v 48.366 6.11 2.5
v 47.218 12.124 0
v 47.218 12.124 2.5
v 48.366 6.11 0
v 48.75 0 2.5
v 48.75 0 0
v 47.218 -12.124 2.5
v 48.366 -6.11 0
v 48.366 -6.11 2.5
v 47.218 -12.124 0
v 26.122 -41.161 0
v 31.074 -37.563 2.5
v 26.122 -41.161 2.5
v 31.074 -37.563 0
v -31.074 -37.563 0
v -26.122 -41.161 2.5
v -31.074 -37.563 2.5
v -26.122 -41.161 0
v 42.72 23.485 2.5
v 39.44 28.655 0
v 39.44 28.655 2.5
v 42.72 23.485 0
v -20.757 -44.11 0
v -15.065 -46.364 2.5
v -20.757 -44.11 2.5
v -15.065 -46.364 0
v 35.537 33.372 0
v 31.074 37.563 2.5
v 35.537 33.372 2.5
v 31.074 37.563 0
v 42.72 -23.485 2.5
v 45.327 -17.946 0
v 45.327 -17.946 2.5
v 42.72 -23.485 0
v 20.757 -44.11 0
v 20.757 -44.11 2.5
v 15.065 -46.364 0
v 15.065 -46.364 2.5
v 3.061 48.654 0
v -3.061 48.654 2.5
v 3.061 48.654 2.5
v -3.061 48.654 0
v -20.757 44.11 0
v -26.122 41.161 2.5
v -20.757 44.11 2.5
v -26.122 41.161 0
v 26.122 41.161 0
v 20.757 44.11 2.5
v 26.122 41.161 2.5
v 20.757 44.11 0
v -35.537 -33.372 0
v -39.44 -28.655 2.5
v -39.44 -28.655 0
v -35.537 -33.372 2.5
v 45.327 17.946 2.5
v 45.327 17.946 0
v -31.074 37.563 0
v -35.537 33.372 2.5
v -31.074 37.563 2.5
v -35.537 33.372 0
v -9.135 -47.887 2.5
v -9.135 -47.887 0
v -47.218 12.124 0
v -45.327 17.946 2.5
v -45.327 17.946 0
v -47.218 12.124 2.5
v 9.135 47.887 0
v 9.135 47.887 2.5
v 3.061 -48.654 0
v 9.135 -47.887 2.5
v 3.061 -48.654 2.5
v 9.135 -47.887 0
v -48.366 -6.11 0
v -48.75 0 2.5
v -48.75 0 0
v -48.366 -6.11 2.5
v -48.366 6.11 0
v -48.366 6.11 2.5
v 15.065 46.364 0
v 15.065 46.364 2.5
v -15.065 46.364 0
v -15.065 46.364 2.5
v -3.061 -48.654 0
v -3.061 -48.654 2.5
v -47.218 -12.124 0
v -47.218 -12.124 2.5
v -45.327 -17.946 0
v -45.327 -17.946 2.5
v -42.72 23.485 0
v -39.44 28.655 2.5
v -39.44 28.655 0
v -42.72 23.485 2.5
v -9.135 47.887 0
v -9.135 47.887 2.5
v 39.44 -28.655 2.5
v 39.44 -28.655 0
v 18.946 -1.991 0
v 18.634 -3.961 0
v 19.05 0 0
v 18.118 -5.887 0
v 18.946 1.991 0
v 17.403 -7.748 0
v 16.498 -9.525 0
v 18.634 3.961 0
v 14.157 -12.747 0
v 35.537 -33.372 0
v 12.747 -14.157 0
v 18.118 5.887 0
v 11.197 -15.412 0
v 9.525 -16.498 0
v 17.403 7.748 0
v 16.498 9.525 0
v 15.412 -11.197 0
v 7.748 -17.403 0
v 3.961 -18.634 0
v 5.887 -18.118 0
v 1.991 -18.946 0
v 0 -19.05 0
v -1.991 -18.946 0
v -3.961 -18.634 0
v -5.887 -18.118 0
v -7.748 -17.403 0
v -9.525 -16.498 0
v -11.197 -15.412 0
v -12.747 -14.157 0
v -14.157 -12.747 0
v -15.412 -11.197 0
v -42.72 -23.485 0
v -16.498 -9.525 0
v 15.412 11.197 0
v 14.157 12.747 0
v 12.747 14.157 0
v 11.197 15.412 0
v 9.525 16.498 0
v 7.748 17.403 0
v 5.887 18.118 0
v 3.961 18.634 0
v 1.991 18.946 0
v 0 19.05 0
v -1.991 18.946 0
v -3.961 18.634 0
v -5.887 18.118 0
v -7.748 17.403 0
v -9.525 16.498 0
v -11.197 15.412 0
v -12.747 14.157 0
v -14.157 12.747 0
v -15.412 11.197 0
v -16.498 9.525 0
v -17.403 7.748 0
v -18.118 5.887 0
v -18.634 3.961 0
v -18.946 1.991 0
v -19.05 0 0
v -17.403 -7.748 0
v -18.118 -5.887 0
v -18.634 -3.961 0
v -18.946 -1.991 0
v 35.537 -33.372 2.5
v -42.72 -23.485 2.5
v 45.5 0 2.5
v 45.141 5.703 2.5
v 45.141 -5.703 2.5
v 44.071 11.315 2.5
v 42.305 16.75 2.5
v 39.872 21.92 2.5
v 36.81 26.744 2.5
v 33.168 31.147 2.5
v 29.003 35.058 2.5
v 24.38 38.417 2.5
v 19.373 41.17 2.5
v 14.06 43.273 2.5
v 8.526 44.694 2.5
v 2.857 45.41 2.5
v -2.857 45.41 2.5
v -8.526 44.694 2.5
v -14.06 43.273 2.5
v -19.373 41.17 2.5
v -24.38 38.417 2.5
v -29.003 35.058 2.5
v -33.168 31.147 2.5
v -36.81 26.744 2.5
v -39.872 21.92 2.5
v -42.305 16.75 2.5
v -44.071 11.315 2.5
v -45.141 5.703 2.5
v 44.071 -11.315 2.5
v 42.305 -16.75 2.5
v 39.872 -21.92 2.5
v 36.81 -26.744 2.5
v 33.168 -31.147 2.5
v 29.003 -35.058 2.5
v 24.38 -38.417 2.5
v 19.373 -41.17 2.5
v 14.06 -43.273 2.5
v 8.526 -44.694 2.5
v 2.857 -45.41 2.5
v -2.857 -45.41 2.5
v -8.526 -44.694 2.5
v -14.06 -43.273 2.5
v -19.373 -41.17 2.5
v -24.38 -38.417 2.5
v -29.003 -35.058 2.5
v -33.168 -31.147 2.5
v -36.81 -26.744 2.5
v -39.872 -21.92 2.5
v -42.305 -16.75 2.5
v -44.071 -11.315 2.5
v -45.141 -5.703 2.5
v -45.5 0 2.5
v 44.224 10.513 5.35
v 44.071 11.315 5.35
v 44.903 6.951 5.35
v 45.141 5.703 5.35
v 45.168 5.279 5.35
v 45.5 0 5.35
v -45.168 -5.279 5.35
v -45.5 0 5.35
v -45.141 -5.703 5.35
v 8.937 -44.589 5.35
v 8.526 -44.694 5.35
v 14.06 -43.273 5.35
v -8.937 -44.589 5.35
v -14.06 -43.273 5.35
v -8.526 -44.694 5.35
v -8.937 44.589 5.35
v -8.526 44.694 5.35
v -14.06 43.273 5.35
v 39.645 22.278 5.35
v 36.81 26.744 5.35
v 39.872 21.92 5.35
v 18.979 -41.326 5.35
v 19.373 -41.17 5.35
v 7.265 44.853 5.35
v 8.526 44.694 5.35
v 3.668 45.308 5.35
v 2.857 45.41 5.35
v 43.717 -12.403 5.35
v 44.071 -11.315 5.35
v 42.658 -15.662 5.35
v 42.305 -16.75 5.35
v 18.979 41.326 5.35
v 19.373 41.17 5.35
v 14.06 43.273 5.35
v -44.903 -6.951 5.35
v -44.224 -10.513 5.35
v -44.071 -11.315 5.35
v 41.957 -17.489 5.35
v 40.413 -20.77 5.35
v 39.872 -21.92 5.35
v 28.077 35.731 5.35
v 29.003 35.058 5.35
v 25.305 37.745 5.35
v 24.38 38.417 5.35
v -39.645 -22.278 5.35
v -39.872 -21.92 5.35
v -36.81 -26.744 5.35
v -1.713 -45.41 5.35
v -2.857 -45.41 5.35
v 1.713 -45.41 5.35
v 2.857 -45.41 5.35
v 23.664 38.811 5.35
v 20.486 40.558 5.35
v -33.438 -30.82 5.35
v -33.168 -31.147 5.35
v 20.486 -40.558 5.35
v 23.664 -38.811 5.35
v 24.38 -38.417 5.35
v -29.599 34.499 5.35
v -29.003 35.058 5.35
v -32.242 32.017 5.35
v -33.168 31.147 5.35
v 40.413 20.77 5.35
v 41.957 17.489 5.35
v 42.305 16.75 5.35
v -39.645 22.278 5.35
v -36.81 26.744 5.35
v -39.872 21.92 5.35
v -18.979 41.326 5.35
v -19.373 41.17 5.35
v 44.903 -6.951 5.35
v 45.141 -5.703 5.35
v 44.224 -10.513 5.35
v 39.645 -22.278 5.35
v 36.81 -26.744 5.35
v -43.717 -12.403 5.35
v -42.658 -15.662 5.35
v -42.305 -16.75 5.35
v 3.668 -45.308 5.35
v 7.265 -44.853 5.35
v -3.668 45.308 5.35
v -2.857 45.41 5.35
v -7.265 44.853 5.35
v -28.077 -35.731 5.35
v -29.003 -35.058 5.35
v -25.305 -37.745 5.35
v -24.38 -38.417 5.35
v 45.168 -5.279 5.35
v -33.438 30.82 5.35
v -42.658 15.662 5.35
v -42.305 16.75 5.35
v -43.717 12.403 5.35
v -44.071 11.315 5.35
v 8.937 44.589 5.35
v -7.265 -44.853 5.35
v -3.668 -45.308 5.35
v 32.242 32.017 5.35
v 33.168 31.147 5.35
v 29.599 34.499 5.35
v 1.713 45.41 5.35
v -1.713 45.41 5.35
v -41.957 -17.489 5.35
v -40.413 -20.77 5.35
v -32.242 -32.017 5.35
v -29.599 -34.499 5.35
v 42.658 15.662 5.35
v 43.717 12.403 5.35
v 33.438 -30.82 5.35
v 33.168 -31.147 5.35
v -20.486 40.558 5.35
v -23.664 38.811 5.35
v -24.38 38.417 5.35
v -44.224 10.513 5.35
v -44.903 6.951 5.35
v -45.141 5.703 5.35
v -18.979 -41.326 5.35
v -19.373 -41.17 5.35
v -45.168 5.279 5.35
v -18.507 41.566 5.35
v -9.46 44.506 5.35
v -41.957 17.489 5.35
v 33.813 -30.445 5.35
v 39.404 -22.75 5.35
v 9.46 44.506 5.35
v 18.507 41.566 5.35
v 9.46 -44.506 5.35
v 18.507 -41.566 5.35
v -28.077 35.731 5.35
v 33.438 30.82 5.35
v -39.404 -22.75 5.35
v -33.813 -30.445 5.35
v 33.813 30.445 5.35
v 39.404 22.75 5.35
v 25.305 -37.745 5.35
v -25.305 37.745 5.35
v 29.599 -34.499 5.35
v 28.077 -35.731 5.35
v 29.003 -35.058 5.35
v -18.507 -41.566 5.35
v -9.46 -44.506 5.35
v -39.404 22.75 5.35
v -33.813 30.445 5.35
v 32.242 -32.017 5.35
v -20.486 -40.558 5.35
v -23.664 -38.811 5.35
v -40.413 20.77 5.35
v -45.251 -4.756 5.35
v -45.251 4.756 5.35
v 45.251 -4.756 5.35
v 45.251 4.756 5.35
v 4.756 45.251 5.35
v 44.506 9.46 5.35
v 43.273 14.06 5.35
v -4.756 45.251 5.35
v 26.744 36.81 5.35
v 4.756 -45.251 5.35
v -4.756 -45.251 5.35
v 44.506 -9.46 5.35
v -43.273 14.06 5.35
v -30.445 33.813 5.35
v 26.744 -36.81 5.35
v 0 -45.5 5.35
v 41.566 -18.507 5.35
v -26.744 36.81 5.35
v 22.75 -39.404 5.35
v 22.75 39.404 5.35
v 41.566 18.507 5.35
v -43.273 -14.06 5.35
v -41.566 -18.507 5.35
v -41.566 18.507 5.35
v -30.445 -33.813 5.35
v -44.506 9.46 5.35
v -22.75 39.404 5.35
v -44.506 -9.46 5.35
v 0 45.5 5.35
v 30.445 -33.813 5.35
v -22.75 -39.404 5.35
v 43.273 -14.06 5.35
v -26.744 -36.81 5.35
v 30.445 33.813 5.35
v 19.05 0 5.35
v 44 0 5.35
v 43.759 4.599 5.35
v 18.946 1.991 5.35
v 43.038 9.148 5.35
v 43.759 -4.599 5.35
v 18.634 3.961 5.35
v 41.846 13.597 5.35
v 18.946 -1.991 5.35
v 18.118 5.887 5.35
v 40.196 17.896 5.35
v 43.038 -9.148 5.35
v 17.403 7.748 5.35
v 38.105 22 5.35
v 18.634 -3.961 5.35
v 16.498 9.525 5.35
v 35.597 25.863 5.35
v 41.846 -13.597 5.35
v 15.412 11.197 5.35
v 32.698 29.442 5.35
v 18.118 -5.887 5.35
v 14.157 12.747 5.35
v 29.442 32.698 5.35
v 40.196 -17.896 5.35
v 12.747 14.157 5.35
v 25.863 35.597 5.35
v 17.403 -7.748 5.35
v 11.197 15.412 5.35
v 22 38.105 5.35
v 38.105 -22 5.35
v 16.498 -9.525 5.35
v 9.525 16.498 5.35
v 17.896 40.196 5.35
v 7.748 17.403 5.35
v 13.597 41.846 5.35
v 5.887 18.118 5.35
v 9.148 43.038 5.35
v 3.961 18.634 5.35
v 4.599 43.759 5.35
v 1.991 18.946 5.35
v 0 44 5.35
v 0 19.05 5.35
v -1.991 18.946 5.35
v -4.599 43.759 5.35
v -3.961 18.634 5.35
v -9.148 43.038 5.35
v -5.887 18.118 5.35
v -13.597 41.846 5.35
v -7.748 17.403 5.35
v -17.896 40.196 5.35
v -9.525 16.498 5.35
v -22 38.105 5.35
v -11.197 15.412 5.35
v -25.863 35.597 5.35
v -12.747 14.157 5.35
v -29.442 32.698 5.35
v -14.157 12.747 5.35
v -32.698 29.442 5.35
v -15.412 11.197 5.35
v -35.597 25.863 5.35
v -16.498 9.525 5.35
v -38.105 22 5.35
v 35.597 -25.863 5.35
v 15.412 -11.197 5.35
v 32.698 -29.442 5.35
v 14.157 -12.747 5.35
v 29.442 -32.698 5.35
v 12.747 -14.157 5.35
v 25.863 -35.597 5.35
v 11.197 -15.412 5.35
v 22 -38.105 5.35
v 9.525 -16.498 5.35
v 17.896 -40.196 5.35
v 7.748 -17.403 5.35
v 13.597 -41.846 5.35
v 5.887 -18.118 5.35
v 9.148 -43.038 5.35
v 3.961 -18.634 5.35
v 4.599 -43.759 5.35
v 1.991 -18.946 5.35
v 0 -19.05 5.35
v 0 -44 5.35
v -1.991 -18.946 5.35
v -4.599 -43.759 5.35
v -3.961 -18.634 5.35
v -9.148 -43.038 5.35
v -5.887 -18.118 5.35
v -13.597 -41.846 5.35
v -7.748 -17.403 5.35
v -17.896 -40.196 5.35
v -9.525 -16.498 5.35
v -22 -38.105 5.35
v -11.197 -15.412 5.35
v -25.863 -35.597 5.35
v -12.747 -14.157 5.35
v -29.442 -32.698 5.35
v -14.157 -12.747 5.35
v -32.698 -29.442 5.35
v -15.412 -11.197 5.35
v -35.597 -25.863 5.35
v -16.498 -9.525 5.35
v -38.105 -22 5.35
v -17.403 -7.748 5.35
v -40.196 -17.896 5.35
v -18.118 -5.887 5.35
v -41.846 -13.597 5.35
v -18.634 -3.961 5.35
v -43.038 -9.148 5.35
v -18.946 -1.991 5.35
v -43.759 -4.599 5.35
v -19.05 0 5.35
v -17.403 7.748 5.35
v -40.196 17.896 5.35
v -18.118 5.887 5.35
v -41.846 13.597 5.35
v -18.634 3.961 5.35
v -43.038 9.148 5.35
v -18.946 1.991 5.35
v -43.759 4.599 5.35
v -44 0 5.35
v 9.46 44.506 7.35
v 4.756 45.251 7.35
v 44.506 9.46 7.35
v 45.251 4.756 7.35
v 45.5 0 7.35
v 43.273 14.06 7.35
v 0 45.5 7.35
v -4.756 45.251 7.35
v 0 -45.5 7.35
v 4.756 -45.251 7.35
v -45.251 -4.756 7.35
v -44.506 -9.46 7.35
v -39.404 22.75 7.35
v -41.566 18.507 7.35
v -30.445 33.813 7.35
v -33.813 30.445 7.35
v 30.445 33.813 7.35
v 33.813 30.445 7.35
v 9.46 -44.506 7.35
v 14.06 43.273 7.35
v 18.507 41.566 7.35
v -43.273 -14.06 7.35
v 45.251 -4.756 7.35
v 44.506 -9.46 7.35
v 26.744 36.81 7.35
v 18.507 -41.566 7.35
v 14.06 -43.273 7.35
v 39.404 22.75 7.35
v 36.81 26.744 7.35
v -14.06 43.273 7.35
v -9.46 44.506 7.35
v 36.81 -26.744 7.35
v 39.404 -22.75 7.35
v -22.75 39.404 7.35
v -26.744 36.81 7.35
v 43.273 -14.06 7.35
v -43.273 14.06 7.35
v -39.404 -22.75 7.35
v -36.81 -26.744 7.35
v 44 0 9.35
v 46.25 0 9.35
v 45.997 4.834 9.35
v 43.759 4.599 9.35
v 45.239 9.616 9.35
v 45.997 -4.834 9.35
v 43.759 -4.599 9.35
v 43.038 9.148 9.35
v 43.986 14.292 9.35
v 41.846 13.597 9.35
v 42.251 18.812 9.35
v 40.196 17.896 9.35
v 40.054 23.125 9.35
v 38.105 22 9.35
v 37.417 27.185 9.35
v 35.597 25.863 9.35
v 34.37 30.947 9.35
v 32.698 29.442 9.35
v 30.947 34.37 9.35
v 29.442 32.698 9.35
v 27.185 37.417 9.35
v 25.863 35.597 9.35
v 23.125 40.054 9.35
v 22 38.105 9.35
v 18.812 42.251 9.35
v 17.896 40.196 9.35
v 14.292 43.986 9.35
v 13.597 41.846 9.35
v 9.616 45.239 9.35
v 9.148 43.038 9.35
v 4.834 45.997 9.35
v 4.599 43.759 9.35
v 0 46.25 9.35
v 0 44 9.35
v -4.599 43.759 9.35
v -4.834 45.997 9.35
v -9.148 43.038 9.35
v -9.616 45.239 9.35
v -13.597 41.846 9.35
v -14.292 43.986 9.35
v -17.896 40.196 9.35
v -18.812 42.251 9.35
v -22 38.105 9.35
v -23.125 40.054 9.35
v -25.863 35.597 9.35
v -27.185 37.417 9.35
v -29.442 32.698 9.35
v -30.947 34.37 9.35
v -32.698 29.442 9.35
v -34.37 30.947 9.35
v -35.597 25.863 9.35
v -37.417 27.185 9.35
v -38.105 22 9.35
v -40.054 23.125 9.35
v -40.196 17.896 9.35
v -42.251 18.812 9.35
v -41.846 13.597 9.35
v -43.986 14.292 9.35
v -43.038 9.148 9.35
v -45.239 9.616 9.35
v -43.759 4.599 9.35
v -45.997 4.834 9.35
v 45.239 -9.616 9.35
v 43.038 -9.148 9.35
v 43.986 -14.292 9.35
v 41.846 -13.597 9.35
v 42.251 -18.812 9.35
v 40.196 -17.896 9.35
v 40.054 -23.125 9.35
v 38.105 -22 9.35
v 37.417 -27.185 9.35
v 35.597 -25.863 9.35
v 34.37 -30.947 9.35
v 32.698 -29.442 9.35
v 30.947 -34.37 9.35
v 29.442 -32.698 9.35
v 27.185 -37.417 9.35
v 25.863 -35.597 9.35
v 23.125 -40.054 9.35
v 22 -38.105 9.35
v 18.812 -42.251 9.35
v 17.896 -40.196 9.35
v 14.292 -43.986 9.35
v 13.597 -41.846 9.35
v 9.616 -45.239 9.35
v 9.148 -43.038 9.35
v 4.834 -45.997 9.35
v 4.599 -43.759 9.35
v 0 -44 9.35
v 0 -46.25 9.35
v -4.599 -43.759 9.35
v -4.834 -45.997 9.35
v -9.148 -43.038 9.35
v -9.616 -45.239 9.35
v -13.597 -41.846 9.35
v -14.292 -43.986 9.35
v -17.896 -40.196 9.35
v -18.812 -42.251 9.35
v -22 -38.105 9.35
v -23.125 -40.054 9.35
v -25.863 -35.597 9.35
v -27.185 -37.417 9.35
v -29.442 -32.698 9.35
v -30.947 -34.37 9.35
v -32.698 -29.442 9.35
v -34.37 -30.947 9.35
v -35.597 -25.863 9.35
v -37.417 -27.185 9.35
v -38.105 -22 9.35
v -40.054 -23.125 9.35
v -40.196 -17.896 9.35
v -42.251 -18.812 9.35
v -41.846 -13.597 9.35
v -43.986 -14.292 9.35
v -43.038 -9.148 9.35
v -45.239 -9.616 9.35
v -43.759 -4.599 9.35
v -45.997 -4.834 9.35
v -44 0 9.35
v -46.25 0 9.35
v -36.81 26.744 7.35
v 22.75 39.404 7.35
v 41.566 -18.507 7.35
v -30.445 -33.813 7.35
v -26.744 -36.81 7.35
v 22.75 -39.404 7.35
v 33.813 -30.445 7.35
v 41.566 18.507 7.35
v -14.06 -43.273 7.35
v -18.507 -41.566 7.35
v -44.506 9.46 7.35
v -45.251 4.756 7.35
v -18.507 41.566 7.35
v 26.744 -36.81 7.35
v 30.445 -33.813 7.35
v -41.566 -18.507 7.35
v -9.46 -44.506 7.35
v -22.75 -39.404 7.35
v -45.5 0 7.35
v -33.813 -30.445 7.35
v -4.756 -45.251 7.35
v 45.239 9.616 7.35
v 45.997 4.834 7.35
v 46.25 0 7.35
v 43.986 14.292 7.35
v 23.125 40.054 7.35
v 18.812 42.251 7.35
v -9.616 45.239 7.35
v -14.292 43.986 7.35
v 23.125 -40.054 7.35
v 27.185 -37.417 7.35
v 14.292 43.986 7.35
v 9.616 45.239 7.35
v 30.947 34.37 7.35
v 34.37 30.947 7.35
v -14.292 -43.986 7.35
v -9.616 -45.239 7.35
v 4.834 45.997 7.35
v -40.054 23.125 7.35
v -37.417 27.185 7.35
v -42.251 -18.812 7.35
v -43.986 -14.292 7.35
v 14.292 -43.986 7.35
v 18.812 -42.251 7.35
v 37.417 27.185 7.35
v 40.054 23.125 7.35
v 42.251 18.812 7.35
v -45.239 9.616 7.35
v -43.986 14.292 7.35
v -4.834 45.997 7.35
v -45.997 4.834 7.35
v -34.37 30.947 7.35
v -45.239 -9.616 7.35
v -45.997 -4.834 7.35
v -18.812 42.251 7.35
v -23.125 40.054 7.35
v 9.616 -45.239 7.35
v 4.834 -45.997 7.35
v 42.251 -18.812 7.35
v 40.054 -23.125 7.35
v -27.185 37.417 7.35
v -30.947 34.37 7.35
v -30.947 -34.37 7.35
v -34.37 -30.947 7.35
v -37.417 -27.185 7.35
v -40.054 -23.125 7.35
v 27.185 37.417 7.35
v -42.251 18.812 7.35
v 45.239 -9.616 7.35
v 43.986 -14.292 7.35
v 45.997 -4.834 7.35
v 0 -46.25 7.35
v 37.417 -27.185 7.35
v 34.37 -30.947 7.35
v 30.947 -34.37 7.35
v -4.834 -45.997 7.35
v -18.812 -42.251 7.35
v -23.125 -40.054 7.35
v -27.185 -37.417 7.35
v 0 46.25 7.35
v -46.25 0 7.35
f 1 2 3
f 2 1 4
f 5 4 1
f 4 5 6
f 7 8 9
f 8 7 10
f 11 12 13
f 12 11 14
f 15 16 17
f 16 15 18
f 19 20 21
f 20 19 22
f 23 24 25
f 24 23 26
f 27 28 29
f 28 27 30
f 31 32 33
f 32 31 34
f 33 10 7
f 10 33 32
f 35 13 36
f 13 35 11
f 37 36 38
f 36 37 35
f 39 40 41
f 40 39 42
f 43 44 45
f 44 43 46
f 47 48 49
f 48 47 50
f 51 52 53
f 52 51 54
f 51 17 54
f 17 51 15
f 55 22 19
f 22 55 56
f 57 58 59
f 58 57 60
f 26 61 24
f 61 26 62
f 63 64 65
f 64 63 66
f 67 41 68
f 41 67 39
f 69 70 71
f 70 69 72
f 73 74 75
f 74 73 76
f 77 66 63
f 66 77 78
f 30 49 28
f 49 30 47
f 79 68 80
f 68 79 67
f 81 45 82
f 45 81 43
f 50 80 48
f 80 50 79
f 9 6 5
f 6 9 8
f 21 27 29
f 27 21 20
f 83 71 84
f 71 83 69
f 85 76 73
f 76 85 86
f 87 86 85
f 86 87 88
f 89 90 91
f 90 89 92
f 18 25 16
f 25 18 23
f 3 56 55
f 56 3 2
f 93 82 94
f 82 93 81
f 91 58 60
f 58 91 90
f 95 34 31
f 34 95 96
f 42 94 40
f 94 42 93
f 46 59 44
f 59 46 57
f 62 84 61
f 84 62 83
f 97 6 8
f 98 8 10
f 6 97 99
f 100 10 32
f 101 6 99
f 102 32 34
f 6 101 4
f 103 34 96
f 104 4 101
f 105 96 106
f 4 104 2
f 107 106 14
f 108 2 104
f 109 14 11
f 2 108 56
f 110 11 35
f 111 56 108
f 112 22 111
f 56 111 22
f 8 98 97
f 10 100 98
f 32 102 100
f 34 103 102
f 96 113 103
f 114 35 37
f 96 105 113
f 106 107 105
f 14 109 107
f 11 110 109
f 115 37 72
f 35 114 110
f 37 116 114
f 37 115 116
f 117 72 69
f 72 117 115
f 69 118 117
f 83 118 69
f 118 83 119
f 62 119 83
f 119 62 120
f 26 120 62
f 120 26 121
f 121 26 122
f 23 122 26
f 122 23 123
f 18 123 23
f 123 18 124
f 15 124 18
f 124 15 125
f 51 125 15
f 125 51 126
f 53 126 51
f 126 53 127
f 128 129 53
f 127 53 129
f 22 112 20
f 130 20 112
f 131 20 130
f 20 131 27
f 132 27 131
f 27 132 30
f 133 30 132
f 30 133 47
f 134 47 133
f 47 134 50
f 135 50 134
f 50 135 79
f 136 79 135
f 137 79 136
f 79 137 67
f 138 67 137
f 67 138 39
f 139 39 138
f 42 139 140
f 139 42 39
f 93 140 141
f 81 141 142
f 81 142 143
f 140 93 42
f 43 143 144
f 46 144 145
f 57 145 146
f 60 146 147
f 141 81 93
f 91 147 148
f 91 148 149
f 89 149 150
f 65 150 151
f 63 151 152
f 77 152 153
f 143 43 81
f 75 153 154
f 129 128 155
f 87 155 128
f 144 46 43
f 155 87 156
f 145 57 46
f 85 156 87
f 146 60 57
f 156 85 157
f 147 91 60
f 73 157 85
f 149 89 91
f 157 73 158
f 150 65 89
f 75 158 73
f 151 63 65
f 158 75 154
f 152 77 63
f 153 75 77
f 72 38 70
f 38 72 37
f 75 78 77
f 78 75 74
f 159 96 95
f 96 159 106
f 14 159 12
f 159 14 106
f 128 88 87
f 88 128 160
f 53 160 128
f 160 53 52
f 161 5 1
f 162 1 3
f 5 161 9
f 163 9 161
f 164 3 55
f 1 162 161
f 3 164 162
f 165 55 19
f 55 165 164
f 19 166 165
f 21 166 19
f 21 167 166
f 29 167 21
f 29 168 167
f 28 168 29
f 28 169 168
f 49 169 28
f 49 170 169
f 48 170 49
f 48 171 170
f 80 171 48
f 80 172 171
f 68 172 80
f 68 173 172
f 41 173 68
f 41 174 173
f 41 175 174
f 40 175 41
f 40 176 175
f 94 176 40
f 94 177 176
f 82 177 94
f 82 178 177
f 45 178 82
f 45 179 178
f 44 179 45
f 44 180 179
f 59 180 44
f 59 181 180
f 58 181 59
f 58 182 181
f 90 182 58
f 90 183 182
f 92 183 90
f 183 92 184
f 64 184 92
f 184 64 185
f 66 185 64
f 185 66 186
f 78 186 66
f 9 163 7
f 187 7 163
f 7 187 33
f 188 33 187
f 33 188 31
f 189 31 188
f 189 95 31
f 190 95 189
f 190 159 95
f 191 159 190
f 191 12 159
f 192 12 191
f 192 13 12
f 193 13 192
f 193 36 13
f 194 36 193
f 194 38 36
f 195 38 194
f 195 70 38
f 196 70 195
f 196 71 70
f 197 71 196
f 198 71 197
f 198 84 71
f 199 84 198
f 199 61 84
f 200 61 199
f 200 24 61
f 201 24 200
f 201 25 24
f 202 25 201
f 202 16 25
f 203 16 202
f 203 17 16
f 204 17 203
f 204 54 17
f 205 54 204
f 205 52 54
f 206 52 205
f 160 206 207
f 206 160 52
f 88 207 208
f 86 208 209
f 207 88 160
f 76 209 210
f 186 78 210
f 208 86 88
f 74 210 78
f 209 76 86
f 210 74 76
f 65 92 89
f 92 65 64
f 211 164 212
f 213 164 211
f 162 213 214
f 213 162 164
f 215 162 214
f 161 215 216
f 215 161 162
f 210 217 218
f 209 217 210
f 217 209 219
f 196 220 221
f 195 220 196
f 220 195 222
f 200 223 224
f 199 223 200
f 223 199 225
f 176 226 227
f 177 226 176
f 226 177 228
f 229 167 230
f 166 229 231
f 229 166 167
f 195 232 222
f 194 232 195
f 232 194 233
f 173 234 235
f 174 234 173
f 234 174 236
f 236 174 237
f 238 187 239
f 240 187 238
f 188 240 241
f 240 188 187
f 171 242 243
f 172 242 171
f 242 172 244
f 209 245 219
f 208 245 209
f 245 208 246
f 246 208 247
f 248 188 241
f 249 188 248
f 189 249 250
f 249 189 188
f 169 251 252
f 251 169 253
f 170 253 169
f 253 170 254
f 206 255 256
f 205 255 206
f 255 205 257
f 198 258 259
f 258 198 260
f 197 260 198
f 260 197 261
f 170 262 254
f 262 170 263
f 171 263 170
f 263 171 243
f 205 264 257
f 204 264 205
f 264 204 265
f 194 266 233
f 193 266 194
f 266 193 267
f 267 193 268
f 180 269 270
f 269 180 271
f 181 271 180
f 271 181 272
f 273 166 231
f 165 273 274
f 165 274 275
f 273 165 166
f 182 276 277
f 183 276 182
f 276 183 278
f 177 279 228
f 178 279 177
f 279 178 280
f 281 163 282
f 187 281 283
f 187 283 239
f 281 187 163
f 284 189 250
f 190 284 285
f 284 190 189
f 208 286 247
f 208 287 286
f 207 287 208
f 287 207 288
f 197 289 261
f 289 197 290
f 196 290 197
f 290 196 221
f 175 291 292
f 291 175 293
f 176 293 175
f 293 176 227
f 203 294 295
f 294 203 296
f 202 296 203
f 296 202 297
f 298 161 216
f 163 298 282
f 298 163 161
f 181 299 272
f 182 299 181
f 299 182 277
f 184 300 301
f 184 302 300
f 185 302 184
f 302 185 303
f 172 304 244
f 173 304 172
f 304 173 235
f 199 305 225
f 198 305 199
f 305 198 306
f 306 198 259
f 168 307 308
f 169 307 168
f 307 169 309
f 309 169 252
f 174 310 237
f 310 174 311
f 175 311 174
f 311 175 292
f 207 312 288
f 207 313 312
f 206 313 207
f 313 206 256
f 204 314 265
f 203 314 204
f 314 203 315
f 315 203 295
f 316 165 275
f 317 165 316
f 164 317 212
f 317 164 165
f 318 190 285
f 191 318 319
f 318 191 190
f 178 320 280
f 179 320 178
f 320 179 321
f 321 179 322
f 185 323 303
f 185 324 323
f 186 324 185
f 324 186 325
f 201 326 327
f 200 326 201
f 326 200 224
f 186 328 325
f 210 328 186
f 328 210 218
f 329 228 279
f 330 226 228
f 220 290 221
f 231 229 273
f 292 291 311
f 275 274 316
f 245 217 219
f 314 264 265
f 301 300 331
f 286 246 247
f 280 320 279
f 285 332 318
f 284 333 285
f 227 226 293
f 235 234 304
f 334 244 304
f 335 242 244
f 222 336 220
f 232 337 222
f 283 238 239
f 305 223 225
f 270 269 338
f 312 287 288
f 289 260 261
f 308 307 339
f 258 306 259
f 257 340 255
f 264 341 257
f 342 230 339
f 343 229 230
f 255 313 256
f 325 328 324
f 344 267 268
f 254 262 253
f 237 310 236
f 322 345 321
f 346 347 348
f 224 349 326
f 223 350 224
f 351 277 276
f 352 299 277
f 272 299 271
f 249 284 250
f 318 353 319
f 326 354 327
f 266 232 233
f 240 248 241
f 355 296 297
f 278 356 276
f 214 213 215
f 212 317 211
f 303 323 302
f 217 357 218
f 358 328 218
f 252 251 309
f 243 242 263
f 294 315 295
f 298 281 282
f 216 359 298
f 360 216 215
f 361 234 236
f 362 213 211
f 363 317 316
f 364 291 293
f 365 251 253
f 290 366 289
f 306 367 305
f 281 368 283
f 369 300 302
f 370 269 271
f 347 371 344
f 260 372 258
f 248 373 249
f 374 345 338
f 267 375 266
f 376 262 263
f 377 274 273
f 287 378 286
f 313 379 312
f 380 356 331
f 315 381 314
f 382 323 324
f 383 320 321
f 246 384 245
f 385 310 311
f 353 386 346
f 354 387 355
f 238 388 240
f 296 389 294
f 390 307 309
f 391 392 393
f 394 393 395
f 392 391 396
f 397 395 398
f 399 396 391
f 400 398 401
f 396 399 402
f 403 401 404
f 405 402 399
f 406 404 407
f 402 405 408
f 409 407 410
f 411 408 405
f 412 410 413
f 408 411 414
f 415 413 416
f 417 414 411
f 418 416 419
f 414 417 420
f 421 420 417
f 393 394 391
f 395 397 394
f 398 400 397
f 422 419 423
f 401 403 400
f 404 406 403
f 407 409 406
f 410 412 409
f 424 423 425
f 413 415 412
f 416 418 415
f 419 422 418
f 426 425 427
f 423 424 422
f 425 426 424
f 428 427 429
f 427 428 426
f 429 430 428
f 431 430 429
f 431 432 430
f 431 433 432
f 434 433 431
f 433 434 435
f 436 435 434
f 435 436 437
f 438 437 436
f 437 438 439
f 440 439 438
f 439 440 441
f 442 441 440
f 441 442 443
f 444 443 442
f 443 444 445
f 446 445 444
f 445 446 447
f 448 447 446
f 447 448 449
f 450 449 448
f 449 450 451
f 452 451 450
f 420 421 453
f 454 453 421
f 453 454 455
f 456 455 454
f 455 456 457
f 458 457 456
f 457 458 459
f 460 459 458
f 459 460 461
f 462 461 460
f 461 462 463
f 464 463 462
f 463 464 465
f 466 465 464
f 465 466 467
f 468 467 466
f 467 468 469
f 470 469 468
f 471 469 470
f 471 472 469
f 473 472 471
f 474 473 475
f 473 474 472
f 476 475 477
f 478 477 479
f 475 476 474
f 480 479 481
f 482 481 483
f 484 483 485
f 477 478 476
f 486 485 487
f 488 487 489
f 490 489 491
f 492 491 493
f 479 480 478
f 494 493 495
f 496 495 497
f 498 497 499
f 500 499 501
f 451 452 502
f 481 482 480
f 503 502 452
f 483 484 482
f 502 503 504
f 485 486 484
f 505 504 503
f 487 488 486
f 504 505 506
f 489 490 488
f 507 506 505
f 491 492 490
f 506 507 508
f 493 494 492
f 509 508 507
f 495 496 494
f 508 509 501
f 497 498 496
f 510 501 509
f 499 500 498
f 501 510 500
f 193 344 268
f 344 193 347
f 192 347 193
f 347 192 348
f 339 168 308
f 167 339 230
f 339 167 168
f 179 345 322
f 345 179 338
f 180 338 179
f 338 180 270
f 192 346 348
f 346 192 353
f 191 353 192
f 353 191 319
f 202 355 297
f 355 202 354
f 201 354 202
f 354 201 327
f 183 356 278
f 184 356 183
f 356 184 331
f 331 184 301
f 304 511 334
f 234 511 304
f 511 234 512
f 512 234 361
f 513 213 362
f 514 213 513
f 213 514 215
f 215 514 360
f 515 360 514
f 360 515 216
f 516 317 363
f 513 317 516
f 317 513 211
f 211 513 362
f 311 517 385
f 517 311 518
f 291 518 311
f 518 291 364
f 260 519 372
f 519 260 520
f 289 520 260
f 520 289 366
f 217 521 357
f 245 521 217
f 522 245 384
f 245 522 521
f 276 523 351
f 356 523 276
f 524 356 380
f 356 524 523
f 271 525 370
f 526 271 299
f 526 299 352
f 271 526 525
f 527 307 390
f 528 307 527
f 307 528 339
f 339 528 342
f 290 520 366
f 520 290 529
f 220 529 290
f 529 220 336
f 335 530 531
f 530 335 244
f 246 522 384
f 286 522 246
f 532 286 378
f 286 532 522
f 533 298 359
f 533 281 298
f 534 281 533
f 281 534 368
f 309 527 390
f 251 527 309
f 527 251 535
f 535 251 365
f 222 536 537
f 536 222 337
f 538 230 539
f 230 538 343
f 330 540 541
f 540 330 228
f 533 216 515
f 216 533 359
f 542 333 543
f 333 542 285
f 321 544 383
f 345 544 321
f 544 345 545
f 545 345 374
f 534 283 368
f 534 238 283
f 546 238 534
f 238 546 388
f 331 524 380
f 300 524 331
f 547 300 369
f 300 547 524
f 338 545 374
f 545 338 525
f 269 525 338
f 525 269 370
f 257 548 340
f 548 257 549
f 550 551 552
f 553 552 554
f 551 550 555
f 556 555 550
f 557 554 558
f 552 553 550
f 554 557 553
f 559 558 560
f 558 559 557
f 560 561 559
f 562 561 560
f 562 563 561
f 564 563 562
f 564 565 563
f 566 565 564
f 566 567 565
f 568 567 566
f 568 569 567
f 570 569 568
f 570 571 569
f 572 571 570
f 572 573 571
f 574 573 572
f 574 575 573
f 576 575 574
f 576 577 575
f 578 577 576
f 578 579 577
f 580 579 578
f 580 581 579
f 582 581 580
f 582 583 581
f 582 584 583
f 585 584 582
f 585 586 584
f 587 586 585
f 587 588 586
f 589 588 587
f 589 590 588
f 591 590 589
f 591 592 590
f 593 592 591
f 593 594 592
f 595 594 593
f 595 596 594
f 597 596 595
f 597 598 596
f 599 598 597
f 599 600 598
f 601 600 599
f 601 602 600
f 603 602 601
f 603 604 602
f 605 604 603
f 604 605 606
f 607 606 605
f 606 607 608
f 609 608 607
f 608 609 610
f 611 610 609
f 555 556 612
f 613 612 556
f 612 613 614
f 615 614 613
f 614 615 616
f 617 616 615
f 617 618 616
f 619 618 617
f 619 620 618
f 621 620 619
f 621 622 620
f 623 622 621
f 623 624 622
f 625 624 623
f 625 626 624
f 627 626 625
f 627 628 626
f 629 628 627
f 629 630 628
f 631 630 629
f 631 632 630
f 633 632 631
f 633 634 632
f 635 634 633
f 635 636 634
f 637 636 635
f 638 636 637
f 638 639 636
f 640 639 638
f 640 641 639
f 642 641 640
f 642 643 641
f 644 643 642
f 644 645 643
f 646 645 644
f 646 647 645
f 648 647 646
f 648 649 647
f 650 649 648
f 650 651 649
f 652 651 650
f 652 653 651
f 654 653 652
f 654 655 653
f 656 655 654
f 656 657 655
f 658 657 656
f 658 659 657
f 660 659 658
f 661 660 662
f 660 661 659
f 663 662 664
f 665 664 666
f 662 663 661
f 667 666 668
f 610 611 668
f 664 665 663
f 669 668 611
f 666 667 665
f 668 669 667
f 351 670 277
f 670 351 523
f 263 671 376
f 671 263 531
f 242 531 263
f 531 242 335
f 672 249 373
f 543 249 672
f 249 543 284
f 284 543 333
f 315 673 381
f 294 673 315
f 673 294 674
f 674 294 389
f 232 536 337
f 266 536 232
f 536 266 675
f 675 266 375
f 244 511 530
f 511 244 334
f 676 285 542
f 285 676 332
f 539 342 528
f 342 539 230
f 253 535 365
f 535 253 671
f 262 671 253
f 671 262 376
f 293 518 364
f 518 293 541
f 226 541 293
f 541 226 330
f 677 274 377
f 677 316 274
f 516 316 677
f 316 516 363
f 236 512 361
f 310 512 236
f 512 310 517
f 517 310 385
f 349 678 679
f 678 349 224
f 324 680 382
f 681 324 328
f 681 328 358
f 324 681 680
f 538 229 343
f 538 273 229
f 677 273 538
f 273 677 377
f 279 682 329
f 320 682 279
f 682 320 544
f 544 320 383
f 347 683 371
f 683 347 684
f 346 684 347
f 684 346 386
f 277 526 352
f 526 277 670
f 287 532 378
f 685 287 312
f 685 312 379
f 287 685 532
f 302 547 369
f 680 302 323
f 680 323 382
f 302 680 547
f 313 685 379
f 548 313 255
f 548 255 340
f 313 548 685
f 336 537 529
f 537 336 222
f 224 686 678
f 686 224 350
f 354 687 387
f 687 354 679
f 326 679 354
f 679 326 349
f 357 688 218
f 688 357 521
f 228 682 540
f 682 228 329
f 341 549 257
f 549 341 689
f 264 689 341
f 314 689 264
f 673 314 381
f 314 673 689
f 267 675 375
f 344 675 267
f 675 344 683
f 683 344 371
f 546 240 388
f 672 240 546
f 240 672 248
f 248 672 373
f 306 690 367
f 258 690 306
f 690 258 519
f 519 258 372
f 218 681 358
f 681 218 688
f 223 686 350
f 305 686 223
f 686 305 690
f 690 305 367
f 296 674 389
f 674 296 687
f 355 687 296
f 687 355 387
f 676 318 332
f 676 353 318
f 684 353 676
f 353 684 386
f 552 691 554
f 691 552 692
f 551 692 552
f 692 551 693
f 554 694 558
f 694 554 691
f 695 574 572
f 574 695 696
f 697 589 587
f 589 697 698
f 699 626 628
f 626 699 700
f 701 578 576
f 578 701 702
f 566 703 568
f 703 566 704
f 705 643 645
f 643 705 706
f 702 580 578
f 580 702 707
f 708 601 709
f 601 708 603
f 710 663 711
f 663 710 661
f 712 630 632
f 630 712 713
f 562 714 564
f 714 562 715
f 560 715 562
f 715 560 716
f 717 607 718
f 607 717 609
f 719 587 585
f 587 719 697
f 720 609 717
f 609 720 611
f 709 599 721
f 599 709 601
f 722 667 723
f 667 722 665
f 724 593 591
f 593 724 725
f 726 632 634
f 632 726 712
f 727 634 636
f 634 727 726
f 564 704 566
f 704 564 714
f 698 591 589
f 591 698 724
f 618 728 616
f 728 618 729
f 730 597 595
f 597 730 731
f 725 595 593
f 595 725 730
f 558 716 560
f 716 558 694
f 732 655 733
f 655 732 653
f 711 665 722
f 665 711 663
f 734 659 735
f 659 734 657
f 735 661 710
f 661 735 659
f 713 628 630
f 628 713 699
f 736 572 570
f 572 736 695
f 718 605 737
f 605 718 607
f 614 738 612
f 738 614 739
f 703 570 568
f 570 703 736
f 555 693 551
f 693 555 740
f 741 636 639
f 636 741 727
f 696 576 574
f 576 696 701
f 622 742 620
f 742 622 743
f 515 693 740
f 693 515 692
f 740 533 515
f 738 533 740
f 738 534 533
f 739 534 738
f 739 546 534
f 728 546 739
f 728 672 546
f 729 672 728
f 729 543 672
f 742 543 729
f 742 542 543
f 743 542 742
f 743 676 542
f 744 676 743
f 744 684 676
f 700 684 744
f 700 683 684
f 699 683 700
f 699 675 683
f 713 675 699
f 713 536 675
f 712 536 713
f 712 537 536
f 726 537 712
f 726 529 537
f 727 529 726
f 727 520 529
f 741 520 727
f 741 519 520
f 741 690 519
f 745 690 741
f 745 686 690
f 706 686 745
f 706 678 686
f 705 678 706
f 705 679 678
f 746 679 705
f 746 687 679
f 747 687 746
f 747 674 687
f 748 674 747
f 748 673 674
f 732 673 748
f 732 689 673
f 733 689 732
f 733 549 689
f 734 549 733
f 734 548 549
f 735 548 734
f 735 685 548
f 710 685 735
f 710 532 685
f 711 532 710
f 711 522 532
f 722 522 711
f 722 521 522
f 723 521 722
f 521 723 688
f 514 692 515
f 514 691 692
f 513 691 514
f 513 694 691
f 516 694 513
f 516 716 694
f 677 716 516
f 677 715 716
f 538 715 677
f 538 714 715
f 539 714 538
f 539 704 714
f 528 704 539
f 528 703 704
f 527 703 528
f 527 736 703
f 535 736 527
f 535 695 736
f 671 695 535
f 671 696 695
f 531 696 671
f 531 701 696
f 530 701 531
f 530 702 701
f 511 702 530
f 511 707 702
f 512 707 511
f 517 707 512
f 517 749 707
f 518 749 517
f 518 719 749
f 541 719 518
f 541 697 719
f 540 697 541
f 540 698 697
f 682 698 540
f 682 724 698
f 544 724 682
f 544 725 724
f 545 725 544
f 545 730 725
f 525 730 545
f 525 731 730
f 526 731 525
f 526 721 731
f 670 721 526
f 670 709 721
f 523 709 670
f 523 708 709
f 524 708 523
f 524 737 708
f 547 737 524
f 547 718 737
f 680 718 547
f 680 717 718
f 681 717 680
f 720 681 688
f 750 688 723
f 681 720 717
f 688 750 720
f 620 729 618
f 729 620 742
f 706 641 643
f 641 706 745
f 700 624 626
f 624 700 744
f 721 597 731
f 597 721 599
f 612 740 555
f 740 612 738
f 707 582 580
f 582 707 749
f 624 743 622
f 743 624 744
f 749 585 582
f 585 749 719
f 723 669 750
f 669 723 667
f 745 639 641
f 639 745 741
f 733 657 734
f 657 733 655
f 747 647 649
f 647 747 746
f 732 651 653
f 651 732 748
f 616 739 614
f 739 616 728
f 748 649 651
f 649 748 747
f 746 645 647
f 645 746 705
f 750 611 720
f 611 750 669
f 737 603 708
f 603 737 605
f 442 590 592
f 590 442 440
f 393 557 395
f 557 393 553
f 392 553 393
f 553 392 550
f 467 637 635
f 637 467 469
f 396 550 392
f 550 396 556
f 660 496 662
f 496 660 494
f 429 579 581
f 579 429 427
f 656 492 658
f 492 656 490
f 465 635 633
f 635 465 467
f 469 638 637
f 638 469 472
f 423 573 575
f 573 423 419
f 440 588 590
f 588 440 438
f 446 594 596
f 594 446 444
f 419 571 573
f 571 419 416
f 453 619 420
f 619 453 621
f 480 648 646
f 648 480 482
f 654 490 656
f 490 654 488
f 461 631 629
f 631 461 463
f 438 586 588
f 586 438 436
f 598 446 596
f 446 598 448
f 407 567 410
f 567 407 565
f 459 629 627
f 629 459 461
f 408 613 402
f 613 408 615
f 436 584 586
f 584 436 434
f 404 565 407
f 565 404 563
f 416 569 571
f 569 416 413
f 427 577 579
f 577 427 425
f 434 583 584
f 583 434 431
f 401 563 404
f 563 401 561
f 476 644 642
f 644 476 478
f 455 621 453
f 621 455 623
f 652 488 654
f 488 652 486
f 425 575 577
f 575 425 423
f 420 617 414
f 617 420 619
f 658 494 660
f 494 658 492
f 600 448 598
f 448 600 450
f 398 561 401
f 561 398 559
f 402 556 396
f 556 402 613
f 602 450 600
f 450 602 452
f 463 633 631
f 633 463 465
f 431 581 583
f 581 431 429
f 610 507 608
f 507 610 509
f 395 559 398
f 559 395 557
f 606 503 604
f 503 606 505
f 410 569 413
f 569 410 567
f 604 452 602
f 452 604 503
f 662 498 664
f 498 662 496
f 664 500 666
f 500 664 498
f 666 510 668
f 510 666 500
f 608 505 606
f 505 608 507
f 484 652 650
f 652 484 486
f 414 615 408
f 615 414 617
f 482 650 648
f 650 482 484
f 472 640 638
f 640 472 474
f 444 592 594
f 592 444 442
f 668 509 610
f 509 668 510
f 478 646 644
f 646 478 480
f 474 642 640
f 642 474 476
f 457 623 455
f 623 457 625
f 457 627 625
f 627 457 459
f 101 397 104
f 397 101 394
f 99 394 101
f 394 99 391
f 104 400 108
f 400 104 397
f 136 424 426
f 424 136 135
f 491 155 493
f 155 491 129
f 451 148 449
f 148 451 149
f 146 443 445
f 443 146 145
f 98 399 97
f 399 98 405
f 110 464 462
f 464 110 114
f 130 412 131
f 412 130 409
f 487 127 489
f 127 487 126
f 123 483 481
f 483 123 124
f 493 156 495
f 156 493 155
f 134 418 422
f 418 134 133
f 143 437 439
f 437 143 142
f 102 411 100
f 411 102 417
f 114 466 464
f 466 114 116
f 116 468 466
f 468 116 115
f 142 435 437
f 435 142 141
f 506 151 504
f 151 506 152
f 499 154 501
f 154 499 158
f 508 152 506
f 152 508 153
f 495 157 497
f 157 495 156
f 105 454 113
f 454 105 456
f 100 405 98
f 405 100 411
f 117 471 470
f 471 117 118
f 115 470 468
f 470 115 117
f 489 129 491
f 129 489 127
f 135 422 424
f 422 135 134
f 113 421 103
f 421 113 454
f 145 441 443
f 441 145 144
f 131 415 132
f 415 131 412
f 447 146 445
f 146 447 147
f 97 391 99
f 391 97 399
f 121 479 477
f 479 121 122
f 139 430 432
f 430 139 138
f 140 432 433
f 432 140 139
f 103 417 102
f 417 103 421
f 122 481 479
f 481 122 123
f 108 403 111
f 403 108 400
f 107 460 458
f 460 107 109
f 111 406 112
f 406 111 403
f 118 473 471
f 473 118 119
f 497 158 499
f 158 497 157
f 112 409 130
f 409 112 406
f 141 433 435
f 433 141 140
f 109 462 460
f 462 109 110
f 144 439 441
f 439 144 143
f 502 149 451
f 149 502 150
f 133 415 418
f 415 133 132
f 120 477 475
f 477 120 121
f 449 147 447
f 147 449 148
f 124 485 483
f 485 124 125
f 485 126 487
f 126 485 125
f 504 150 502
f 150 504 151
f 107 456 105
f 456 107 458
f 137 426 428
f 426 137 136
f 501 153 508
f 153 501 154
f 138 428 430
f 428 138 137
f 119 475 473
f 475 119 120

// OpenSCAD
//Bit diameter
in=1.5;
//overhang of tab
tabhang=.75;
//Resolution
res=60;
//Calculation
in2mm=in*25.4;
diatabhang=2*tabhang;

module insert(){
union(){
union(){
    cylinder(2.5, d=97.5, $fn=50);
    translate([0,0,2.5]) cylinder(2.85, d=91, $fn=50);
}
   difference(){ 
       union(){
           translate([0,0,5.35]) cylinder(4, d=91, $fn=res);
           translate([0,0,7.35]) cylinder(2, d=91+diatabhang, $fn=res);
       }
           translate([0,0,5.35]) cylinder(6, d=88, $fn=res); 
}
}
}

difference(){
    insert();
    cylinder(5.35, d=in2mm, $fn=res);
}
